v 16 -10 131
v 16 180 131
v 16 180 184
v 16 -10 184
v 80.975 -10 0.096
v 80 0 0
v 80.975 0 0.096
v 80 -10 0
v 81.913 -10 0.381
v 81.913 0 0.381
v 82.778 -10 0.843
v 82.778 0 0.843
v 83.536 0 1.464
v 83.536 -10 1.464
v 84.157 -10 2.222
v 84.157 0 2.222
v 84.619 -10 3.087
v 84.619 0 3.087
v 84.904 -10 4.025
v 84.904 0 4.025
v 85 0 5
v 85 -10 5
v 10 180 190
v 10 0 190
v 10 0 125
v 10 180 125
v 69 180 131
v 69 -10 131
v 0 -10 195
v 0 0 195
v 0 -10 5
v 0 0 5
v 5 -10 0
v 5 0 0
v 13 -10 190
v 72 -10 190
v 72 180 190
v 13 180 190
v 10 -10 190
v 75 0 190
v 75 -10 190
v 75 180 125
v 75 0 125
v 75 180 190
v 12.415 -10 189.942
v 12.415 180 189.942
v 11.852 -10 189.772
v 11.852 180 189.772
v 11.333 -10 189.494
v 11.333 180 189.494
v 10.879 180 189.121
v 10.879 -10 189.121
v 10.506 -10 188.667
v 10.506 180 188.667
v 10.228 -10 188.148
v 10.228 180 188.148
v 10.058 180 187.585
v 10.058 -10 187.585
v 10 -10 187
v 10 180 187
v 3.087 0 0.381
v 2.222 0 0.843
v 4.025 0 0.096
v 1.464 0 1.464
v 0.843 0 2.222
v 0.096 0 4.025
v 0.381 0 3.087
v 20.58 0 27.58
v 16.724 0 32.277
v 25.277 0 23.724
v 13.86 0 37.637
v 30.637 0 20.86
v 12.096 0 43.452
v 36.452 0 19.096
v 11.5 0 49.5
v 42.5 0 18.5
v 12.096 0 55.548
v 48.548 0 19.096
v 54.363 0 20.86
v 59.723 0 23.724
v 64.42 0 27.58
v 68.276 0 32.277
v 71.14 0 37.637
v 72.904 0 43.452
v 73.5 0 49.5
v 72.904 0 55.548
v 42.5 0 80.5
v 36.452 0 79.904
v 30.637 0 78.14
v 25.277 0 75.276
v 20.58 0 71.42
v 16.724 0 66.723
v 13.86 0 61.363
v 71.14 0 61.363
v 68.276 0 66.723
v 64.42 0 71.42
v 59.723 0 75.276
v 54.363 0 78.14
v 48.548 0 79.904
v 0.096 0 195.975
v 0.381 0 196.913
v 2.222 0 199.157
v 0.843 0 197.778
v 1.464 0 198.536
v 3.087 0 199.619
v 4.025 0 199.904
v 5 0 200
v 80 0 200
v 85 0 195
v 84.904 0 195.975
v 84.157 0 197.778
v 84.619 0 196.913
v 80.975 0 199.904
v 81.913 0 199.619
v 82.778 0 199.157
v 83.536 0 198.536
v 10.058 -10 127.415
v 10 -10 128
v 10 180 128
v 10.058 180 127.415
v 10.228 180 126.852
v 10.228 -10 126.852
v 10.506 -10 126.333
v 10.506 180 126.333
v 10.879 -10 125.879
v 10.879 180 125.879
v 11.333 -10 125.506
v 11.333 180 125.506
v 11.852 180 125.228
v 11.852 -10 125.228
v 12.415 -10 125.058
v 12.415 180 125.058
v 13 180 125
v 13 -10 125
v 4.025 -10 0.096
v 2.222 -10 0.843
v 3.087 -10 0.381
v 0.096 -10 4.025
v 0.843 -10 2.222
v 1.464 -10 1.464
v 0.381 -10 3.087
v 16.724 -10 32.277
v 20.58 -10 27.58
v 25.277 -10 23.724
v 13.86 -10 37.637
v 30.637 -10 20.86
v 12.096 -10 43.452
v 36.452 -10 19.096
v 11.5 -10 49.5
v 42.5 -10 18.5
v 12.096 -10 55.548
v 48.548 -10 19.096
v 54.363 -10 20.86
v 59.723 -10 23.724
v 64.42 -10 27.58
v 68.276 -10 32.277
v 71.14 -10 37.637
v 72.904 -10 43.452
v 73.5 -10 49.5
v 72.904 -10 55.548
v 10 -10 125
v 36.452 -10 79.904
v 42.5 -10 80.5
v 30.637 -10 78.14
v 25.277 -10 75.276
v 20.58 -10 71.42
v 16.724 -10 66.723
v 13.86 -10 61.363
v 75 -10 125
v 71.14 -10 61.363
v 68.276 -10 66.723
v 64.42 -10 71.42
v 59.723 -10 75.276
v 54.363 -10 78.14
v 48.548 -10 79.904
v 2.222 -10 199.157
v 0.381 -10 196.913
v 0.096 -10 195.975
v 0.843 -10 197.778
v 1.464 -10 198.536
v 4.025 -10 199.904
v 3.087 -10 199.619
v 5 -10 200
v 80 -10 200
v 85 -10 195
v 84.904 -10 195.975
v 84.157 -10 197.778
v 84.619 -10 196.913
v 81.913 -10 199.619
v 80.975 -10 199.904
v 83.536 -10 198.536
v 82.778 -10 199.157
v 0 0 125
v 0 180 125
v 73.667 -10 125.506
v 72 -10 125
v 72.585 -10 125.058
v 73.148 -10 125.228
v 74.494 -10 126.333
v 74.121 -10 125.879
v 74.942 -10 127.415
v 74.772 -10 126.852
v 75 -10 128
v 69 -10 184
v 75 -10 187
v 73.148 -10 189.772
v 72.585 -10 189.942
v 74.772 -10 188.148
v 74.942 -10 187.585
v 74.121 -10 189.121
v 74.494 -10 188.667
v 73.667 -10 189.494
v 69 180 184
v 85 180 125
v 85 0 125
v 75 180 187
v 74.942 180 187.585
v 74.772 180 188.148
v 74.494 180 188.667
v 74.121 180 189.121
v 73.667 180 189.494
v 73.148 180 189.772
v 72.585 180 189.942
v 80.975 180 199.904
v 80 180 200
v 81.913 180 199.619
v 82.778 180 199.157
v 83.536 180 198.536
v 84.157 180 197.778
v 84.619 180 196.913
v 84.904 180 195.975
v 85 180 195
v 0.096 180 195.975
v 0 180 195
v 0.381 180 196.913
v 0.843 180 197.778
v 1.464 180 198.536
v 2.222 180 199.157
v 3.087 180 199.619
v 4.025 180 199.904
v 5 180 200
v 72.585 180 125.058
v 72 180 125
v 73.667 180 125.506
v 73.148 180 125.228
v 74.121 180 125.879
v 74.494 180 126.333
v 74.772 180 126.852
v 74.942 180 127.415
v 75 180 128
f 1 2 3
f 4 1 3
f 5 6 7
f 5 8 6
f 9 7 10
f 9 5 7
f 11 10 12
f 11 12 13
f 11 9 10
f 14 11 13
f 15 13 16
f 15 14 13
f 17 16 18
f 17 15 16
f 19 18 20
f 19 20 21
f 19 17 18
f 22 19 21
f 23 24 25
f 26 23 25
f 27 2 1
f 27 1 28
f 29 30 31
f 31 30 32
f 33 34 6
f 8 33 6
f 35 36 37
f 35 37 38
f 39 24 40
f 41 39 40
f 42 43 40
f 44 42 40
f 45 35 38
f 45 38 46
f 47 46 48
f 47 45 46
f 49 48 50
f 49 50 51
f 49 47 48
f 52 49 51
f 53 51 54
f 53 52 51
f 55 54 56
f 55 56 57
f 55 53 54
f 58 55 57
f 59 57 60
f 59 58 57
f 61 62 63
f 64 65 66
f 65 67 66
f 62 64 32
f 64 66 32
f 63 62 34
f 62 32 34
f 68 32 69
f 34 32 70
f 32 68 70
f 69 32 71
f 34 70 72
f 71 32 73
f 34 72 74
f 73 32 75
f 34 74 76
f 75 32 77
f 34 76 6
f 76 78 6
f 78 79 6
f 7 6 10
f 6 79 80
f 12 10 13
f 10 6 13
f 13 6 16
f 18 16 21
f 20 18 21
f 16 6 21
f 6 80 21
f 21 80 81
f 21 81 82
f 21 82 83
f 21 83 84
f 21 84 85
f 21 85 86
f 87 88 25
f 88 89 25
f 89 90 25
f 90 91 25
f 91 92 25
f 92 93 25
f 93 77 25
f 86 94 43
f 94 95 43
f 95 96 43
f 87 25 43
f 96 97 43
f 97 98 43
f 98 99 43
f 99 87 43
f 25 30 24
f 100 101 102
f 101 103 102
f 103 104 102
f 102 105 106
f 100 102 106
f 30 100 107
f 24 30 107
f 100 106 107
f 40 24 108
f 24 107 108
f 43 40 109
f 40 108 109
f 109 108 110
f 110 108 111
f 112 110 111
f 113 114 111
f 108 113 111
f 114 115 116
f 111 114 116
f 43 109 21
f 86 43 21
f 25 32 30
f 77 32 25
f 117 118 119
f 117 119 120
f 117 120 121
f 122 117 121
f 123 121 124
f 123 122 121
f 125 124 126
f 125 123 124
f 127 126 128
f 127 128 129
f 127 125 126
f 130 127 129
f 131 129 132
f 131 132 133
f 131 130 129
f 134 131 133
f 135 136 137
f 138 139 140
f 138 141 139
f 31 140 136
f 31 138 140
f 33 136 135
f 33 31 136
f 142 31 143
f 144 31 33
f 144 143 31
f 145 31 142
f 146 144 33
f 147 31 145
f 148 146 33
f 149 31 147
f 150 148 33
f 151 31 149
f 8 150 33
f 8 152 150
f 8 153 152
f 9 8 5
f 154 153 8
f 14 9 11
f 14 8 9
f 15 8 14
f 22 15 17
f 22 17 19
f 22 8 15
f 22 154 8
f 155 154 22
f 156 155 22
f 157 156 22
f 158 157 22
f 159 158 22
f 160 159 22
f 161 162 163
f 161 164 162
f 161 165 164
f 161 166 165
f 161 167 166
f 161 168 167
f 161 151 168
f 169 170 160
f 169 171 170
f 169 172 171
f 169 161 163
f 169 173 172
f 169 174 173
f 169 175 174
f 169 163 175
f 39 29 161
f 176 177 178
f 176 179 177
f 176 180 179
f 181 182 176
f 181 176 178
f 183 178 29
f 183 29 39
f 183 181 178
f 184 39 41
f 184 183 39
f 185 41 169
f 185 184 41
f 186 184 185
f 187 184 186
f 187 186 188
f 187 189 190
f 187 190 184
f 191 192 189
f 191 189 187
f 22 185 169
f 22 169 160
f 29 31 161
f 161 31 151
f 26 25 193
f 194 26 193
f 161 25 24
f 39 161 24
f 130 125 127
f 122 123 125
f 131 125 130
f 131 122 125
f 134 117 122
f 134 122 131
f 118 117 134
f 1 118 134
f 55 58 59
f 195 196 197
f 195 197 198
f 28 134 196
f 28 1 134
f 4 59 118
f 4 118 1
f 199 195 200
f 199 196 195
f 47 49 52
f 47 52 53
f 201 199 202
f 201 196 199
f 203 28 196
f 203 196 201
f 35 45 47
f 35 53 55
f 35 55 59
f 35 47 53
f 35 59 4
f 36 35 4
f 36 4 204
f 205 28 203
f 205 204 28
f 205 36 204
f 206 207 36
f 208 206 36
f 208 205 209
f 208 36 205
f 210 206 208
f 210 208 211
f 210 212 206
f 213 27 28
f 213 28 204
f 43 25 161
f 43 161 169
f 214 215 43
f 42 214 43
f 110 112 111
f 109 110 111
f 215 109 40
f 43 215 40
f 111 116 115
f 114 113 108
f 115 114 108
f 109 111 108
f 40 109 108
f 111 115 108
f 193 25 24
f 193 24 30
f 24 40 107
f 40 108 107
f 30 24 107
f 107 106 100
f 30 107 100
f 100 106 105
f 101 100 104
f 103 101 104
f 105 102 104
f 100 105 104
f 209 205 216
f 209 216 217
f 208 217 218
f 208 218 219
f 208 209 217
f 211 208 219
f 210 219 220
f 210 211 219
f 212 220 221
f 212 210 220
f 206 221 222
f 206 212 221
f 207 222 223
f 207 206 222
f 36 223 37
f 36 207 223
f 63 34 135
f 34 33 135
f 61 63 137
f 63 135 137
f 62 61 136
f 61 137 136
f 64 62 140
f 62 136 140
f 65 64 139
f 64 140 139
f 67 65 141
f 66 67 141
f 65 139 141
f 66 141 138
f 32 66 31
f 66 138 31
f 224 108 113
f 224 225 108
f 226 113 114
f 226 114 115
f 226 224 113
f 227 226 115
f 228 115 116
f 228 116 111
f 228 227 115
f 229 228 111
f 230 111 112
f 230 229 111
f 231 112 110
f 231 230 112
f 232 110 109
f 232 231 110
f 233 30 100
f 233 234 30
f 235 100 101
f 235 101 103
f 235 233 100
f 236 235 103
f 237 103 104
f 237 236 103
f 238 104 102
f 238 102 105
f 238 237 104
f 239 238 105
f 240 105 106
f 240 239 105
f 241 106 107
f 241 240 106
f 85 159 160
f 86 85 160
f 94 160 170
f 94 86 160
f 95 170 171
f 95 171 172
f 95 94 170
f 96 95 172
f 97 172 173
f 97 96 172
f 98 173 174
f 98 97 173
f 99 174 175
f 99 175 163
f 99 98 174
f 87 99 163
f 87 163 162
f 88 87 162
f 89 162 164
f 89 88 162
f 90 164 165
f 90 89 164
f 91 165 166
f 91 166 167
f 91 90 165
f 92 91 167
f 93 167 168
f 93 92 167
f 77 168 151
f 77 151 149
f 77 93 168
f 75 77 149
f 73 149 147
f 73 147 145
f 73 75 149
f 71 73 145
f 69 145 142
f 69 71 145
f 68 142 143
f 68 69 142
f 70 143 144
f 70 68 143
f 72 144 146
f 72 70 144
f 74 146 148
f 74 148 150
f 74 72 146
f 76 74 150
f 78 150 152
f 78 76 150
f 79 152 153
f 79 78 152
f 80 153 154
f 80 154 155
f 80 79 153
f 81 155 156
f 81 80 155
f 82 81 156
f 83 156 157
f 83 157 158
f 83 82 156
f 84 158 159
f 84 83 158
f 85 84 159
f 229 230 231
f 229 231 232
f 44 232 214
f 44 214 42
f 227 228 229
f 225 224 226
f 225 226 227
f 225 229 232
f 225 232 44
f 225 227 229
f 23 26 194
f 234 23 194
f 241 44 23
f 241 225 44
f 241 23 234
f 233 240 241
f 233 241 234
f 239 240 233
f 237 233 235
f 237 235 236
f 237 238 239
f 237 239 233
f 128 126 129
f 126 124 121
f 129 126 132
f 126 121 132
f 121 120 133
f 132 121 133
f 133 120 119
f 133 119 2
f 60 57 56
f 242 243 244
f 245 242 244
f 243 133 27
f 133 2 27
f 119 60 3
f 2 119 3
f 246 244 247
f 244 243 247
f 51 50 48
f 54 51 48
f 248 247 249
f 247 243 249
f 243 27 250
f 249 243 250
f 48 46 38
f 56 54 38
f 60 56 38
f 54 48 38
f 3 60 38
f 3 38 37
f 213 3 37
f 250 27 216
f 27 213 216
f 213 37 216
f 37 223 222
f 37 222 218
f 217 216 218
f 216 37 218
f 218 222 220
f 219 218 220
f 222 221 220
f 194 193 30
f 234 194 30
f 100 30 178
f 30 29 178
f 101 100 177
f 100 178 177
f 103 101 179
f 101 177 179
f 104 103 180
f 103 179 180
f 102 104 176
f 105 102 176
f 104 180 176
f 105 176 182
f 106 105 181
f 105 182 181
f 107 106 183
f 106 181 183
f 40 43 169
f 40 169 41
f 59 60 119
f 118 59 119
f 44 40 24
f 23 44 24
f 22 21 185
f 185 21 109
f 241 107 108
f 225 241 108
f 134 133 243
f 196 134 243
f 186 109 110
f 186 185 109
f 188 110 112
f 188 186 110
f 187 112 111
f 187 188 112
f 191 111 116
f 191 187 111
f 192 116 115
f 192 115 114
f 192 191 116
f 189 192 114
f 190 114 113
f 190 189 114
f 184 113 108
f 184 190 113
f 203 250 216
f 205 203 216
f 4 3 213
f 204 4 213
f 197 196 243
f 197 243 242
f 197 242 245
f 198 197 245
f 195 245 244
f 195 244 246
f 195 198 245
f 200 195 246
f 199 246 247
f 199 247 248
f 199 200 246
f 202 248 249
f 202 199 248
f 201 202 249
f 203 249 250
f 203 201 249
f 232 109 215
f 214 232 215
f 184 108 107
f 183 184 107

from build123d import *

# Parameters (mm, degrees)
F0_R     = 31
F0_W     = 65
F0_H     = 65
F1_DEPTH = 10
F2_W     = 53
F2_H     = 53
F3_DEPTH = 190
F5_DEPTH = 180
F6_R     = 5
F6_2_R   = 5


with BuildPart() as f1:
    # F0 (on Front) → F1 (new body)
    with BuildSketch(Plane.XZ):
        Polygon((0, 125), (0, 0), (85, 0), (85, 200), (0, 200), align=None)
        with Locations((42.5, 49.5)):
            Circle(F0_R, mode=Mode.SUBTRACT)
        with Locations((42.5, 157.5)):
            Rectangle(F0_W, F0_H, mode=Mode.SUBTRACT)
    extrude(amount=F1_DEPTH)

    # F6#2
    f6_2_edges = [f1.edges().sort_by_distance(p)[0] for p in [
        (85, -5, 200),
        (0, -5, 200),
        (85, -5, 0),
        (0, -5, 0),
    ]]
    fillet(f6_2_edges, radius=F6_2_R)


with BuildPart() as f3:
    # F2 (on face) → F3 (new body)
    with BuildSketch(Plane.XZ.offset(10)):
        with BuildLine():
            ThreePointArc((10, 128), (10.87868, 125.87868), (13, 125))
            Line((13, 125), (72, 125))
            ThreePointArc((72, 125), (74.12132, 125.87868), (75, 128))
            Line((75, 128), (75, 187))
            ThreePointArc((75, 187), (74.12132, 189.12132), (72, 190))
            Line((72, 190), (13, 190))
            ThreePointArc((13, 190), (10.87868, 189.12132), (10, 187))
            Line((10, 187), (10, 128))
        make_face()
        with Locations((42.5, 157.5)):
            Rectangle(F2_W, F2_H, mode=Mode.SUBTRACT)
    extrude(amount=-F3_DEPTH)


with BuildPart() as f5:
    # F4 (on face) → F5 (new body)
    with BuildSketch(Plane(origin=(0, 0, 0), x_dir=(-1, 0, 0), z_dir=(0, 1, 0))):
        Polygon((-85, 125), (-75, 125), (-75, 190), (-10, 190), (-10, 125), (0, 125), (0, 200), (-85, 200), align=None)
    extrude(amount=F5_DEPTH)

    # F6
    f6_edges = [f5.edges().sort_by_distance(p)[0] for p in [
        (85, 90, 200),
        (0, 90, 200),
    ]]
    fillet(f6_edges, radius=F6_R)


solid = Compound([f1.part, f3.part, f5.part])
